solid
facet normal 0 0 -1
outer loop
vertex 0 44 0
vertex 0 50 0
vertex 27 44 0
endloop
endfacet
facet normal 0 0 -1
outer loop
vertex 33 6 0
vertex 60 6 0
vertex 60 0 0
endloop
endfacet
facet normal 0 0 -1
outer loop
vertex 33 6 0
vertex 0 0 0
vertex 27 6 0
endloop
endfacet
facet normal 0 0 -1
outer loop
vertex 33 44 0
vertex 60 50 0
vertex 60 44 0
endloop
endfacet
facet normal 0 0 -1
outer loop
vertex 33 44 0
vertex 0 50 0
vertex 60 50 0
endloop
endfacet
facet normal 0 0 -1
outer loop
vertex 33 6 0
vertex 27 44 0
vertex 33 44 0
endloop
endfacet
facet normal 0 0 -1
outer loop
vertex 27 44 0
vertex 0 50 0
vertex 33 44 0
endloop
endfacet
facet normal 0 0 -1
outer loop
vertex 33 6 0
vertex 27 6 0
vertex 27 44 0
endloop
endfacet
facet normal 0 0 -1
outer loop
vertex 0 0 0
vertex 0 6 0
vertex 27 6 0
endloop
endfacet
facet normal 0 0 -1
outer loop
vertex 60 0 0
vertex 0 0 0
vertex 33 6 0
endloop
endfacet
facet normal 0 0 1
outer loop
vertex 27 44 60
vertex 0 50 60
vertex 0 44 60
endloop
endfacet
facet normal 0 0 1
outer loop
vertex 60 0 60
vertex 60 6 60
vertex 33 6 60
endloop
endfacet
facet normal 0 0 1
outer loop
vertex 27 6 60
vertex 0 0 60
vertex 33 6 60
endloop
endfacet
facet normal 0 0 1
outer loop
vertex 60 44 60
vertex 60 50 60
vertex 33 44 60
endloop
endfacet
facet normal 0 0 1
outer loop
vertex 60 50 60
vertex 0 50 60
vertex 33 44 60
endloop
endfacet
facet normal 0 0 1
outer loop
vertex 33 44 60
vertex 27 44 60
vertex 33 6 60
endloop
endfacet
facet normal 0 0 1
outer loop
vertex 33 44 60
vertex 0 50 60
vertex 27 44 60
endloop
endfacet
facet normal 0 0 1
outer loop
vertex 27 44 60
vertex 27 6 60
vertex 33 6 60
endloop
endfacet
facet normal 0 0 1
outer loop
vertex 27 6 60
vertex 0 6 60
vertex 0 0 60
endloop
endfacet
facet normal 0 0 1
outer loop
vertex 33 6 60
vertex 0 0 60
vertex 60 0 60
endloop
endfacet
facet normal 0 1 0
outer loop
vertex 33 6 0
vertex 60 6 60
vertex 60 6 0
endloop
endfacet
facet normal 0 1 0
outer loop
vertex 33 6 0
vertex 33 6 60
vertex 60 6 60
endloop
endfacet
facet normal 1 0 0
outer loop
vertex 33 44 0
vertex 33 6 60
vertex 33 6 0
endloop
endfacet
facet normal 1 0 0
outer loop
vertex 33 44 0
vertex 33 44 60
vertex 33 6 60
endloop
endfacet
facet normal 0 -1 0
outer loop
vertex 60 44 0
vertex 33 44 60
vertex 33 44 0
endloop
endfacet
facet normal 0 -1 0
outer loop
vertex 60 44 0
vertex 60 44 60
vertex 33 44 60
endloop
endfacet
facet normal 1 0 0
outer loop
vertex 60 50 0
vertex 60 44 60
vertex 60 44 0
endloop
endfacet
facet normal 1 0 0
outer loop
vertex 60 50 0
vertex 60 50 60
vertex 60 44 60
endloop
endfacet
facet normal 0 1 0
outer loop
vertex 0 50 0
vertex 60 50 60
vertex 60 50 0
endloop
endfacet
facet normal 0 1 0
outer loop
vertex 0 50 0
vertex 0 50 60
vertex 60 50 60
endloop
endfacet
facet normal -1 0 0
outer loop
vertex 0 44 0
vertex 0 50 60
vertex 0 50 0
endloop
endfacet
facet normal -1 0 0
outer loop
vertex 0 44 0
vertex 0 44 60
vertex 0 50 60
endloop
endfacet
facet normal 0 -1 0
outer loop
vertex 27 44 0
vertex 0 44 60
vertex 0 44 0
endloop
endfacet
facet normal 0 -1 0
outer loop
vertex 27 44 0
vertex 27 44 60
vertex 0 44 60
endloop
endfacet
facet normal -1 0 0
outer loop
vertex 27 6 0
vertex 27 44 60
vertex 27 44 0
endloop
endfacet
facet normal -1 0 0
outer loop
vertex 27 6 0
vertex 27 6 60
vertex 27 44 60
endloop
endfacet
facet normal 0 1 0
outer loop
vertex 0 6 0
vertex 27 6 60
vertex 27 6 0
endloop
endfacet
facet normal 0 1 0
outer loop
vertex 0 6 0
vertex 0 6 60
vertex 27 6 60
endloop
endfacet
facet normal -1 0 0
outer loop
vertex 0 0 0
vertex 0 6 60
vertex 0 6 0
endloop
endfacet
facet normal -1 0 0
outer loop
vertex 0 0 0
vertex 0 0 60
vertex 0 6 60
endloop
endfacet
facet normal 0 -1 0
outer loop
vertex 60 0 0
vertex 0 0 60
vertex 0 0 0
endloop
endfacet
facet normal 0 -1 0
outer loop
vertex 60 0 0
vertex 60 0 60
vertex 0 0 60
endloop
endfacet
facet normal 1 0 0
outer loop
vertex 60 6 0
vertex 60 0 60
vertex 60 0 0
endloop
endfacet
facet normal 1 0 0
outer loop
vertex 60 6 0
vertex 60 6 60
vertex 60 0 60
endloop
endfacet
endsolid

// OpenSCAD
$fn = 32;

// ----------------------------------------------------------------------
// Structural section: ibeam 60 x 50 mm
// ----------------------------------------------------------------------

// --- parameters (mm) ---
sec_w = 60;               // section width, X
sec_h = 50;               // section height, Y
flange_t = 6;             // flange thickness
web_t = 6;                // web thickness
plate_t = 60;             // cut length, Z (extrusion height)

profile = [[0, 0], [60, 0], [60, 6], [33, 6], [33, 44], [60, 44], [60, 50], [0, 50], [0, 44], [27, 44], [27, 6], [0, 6]];  // primary outline, 12 points, counter clockwise

// --- the one profile operation ---
linear_extrude(height = plate_t) polygon(points = profile);
